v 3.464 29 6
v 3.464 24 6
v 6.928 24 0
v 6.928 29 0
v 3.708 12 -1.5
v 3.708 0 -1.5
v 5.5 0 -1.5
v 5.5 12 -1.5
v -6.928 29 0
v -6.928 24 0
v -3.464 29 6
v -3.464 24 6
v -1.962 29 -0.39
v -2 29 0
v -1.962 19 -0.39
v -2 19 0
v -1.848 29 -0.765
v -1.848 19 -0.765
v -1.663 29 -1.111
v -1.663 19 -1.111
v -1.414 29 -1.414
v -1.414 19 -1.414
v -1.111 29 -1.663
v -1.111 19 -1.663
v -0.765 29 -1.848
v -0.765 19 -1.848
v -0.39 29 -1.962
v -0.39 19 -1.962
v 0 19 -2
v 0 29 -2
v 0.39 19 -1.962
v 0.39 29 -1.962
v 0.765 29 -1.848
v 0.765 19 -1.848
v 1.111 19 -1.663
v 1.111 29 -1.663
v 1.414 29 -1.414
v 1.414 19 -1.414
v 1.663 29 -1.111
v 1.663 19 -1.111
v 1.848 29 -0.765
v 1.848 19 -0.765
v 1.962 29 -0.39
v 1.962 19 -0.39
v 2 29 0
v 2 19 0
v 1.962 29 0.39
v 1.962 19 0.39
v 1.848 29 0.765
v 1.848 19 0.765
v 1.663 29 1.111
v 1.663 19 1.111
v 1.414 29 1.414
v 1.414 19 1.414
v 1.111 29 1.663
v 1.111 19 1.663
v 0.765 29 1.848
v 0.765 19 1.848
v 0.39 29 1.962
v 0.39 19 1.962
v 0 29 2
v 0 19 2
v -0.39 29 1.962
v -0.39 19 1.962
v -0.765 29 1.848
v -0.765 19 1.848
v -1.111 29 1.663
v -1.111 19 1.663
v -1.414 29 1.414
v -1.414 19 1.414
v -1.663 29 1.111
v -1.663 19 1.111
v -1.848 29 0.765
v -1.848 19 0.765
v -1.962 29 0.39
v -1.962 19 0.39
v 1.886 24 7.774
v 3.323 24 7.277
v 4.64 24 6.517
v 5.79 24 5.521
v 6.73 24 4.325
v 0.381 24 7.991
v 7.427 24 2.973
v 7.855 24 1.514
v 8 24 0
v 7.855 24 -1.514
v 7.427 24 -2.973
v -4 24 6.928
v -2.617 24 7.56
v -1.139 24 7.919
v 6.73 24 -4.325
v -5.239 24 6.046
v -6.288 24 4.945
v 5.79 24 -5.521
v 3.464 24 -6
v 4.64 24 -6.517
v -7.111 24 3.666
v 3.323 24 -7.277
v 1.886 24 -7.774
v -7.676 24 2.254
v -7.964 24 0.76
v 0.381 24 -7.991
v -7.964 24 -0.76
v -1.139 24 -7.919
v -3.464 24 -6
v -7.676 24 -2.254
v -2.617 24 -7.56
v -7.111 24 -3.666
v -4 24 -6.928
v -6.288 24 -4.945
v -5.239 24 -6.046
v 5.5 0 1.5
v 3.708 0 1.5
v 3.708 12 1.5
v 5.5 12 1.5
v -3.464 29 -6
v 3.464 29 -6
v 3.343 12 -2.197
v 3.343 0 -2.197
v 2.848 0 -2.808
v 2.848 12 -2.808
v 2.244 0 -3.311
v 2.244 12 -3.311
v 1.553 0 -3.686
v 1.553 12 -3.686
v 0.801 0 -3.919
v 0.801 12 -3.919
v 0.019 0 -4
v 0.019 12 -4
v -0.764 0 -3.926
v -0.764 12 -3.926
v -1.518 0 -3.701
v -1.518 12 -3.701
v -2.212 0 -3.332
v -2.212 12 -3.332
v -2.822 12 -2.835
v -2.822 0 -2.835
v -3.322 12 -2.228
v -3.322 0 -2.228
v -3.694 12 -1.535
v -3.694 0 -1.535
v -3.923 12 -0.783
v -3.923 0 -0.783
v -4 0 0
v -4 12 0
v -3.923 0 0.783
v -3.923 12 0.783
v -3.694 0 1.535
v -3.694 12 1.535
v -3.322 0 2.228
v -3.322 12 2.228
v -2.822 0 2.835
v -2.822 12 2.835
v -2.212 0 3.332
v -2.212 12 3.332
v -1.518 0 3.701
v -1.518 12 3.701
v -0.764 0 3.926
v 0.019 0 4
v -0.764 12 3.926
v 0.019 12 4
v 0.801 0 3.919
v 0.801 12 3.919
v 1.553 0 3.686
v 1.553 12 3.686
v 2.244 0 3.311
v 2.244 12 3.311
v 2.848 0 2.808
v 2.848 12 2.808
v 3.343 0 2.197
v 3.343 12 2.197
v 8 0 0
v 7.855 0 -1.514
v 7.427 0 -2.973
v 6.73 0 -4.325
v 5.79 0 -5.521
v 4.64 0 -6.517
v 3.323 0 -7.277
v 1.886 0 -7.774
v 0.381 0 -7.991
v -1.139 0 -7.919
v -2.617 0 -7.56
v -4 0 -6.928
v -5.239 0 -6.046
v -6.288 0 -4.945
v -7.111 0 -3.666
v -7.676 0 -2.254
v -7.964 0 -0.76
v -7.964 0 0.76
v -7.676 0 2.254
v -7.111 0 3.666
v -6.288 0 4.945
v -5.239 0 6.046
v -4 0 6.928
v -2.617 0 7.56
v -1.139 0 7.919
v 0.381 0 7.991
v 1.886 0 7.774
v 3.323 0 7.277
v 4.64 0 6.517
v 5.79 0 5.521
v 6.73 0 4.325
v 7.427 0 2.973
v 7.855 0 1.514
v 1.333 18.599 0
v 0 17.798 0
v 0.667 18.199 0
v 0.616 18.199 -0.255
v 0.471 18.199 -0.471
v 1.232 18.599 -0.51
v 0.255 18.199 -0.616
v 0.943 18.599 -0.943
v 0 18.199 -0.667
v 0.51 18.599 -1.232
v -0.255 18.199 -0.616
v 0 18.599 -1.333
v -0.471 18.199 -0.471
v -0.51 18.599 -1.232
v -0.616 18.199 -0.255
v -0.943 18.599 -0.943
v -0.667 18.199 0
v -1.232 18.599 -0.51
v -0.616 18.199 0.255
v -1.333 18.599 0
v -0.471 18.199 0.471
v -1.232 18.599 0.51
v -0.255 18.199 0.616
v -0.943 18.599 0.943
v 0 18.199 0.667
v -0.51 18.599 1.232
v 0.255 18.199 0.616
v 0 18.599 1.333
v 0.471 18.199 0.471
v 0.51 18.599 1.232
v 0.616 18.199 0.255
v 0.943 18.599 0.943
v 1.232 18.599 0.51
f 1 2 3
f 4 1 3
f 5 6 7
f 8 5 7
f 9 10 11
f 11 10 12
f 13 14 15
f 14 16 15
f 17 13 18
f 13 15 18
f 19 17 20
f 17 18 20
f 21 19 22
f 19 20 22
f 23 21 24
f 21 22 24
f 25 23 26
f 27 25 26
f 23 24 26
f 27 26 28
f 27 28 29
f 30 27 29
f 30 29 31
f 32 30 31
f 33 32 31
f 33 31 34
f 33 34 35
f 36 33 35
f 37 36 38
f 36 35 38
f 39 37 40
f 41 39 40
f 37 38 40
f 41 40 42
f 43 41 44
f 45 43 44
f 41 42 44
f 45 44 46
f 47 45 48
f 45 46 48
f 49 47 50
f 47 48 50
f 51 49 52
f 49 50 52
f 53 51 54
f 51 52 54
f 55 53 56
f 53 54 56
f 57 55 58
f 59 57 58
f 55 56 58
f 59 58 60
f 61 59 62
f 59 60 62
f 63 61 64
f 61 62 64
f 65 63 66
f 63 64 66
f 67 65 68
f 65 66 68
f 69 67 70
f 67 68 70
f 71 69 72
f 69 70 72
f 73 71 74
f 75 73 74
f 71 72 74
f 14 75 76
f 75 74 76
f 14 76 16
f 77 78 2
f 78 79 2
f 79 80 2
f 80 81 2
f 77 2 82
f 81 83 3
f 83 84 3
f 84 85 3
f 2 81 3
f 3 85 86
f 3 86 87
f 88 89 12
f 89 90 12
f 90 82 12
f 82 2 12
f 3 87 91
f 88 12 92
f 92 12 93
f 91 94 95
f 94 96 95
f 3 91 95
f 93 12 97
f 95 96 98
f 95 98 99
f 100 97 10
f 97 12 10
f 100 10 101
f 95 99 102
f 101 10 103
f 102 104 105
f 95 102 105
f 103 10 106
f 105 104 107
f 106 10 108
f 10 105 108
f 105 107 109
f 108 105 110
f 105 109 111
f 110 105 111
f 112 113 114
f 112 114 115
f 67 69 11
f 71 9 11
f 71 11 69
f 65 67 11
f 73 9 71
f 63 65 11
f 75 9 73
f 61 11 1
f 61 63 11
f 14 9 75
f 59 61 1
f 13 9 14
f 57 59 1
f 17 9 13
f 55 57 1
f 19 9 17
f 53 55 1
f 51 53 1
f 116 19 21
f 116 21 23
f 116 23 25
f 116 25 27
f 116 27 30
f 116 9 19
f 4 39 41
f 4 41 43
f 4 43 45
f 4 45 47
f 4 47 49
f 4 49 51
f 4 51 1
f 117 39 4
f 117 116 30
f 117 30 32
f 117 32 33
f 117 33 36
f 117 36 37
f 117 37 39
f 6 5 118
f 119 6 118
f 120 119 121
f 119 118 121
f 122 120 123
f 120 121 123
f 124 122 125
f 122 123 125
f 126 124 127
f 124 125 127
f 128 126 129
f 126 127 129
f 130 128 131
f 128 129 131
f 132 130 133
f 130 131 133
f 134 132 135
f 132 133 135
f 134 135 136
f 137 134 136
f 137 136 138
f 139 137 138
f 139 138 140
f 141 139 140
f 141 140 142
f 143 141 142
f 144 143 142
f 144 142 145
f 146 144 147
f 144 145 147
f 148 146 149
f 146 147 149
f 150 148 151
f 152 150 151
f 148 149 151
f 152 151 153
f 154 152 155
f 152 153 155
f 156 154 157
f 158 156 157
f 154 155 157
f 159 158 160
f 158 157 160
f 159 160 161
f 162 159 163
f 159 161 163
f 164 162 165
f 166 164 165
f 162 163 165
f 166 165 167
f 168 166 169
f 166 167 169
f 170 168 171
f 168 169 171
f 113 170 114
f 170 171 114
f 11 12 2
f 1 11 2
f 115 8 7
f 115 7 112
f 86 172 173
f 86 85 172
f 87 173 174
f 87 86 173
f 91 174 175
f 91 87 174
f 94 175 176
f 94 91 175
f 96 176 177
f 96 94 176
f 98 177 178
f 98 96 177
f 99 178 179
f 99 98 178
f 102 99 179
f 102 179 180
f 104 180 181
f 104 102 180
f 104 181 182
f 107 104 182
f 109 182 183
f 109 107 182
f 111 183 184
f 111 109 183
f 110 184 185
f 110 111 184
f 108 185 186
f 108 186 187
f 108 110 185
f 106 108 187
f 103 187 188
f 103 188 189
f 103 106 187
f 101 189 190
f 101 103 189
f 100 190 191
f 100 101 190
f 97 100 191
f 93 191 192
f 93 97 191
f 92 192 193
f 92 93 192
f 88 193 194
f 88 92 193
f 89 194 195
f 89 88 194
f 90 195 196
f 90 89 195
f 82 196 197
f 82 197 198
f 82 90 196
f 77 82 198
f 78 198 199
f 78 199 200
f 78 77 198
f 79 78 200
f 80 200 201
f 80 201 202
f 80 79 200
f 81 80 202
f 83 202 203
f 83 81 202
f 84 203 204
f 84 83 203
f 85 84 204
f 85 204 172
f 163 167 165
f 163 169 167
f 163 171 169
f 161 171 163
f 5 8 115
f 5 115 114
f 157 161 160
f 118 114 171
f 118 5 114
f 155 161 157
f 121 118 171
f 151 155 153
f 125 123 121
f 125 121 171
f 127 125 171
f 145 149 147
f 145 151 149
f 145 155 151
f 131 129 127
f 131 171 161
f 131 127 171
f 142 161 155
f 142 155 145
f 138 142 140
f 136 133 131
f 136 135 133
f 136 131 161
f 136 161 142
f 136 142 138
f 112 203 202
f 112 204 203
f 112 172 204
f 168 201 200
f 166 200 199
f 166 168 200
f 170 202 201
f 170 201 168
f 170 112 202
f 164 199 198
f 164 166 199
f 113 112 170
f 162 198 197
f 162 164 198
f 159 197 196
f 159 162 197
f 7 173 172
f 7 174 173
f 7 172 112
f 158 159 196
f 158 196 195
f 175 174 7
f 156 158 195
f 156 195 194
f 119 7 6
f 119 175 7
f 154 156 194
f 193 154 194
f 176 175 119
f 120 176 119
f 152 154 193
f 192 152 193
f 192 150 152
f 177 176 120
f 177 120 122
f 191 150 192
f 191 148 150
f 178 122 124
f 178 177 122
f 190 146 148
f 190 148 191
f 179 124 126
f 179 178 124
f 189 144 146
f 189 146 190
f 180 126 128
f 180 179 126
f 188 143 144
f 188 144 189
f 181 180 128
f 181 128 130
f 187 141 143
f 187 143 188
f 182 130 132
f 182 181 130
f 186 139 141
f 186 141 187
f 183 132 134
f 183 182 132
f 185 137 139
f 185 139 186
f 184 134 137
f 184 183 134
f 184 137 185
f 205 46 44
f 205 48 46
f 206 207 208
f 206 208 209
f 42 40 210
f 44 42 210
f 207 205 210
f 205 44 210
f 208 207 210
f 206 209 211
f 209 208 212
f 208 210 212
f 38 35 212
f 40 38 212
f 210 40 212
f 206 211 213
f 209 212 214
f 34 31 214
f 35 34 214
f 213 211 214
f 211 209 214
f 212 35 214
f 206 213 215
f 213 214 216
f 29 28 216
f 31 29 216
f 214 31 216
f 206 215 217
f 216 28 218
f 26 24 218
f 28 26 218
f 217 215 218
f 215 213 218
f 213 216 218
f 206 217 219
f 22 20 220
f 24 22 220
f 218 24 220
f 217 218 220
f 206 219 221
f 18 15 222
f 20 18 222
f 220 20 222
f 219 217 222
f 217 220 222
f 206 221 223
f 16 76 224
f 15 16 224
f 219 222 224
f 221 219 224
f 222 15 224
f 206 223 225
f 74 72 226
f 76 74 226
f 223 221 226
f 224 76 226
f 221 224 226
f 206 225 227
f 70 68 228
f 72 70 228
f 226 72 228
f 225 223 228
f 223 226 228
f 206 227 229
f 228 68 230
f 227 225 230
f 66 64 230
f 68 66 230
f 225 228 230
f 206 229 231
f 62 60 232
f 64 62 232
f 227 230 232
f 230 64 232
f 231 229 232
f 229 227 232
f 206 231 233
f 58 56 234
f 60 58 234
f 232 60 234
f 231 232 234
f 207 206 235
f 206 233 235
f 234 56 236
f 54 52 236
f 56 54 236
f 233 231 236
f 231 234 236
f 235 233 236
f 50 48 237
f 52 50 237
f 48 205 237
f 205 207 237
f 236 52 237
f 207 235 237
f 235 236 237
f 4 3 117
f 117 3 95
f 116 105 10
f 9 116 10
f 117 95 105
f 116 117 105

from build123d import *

# Parameters (mm, degrees)
SKETCH1_W                 = 4
SKETCH1_H                 = 12
SKETCH1_W_2               = 8
BOSS_EXTRUDE1_DEPTH       = 5
F_4_0MM_DOWEL_HOLE1_D     = 4
F_4_0MM_DOWEL_HOLE1_DEPTH = 10
F_4_0MM_DOWEL_HOLE1_TIP   = 1.201721238
CUT_EXTRUDE1_START        = -12
SKETCH5_W                 = 3
SKETCH5_H                 = 3
CUT_EXTRUDE1_DEPTH        = 12


with BuildPart() as part:
    # Sketch1 → Revolve1 (revolve)
    with BuildSketch(Plane.XY):
        with Locations((6, 6)):
            Rectangle(SKETCH1_W, SKETCH1_H)
        with Locations((4, 18)):
            Rectangle(SKETCH1_W_2, SKETCH1_H)
    revolve(axis=Axis((0, 0, 0), (0, 1, 0)))

    # Sketch2 → Boss-Extrude1 (add)
    with BuildSketch(Plane(origin=(0, 24, 0), x_dir=(1, 0, 0), z_dir=(0, 1, 0))):
        Polygon((6.92820323, 0), (3.464101615, 6), (-3.464101615, 6), (-6.92820323, 0), (-3.464101615, -6), (3.464101615, -6), align=None)
    extrude(amount=BOSS_EXTRUDE1_DEPTH)

    # Ø4.0mm Dowel Hole1
    with Locations(Plane(origin=(0, 29, 0), x_dir=(1, 0, 0), z_dir=(0, 1, 0))):
        with Locations((0, 0)):
            Hole(F_4_0MM_DOWEL_HOLE1_D / 2, depth=F_4_0MM_DOWEL_HOLE1_DEPTH)
            with Locations((0, 0, -(F_4_0MM_DOWEL_HOLE1_DEPTH + F_4_0MM_DOWEL_HOLE1_TIP / 2))):  # 118° drill point
                Cone(0, F_4_0MM_DOWEL_HOLE1_D / 2, F_4_0MM_DOWEL_HOLE1_TIP, mode=Mode.SUBTRACT)

    # Sketch5 → Cut-Extrude1 (cut)
    with BuildSketch(Plane.XZ.offset(CUT_EXTRUDE1_START)):
        with Locations((4, 0)):
            Rectangle(SKETCH5_W, SKETCH5_H)
    extrude(amount=CUT_EXTRUDE1_DEPTH, mode=Mode.SUBTRACT)


solid = part.part
